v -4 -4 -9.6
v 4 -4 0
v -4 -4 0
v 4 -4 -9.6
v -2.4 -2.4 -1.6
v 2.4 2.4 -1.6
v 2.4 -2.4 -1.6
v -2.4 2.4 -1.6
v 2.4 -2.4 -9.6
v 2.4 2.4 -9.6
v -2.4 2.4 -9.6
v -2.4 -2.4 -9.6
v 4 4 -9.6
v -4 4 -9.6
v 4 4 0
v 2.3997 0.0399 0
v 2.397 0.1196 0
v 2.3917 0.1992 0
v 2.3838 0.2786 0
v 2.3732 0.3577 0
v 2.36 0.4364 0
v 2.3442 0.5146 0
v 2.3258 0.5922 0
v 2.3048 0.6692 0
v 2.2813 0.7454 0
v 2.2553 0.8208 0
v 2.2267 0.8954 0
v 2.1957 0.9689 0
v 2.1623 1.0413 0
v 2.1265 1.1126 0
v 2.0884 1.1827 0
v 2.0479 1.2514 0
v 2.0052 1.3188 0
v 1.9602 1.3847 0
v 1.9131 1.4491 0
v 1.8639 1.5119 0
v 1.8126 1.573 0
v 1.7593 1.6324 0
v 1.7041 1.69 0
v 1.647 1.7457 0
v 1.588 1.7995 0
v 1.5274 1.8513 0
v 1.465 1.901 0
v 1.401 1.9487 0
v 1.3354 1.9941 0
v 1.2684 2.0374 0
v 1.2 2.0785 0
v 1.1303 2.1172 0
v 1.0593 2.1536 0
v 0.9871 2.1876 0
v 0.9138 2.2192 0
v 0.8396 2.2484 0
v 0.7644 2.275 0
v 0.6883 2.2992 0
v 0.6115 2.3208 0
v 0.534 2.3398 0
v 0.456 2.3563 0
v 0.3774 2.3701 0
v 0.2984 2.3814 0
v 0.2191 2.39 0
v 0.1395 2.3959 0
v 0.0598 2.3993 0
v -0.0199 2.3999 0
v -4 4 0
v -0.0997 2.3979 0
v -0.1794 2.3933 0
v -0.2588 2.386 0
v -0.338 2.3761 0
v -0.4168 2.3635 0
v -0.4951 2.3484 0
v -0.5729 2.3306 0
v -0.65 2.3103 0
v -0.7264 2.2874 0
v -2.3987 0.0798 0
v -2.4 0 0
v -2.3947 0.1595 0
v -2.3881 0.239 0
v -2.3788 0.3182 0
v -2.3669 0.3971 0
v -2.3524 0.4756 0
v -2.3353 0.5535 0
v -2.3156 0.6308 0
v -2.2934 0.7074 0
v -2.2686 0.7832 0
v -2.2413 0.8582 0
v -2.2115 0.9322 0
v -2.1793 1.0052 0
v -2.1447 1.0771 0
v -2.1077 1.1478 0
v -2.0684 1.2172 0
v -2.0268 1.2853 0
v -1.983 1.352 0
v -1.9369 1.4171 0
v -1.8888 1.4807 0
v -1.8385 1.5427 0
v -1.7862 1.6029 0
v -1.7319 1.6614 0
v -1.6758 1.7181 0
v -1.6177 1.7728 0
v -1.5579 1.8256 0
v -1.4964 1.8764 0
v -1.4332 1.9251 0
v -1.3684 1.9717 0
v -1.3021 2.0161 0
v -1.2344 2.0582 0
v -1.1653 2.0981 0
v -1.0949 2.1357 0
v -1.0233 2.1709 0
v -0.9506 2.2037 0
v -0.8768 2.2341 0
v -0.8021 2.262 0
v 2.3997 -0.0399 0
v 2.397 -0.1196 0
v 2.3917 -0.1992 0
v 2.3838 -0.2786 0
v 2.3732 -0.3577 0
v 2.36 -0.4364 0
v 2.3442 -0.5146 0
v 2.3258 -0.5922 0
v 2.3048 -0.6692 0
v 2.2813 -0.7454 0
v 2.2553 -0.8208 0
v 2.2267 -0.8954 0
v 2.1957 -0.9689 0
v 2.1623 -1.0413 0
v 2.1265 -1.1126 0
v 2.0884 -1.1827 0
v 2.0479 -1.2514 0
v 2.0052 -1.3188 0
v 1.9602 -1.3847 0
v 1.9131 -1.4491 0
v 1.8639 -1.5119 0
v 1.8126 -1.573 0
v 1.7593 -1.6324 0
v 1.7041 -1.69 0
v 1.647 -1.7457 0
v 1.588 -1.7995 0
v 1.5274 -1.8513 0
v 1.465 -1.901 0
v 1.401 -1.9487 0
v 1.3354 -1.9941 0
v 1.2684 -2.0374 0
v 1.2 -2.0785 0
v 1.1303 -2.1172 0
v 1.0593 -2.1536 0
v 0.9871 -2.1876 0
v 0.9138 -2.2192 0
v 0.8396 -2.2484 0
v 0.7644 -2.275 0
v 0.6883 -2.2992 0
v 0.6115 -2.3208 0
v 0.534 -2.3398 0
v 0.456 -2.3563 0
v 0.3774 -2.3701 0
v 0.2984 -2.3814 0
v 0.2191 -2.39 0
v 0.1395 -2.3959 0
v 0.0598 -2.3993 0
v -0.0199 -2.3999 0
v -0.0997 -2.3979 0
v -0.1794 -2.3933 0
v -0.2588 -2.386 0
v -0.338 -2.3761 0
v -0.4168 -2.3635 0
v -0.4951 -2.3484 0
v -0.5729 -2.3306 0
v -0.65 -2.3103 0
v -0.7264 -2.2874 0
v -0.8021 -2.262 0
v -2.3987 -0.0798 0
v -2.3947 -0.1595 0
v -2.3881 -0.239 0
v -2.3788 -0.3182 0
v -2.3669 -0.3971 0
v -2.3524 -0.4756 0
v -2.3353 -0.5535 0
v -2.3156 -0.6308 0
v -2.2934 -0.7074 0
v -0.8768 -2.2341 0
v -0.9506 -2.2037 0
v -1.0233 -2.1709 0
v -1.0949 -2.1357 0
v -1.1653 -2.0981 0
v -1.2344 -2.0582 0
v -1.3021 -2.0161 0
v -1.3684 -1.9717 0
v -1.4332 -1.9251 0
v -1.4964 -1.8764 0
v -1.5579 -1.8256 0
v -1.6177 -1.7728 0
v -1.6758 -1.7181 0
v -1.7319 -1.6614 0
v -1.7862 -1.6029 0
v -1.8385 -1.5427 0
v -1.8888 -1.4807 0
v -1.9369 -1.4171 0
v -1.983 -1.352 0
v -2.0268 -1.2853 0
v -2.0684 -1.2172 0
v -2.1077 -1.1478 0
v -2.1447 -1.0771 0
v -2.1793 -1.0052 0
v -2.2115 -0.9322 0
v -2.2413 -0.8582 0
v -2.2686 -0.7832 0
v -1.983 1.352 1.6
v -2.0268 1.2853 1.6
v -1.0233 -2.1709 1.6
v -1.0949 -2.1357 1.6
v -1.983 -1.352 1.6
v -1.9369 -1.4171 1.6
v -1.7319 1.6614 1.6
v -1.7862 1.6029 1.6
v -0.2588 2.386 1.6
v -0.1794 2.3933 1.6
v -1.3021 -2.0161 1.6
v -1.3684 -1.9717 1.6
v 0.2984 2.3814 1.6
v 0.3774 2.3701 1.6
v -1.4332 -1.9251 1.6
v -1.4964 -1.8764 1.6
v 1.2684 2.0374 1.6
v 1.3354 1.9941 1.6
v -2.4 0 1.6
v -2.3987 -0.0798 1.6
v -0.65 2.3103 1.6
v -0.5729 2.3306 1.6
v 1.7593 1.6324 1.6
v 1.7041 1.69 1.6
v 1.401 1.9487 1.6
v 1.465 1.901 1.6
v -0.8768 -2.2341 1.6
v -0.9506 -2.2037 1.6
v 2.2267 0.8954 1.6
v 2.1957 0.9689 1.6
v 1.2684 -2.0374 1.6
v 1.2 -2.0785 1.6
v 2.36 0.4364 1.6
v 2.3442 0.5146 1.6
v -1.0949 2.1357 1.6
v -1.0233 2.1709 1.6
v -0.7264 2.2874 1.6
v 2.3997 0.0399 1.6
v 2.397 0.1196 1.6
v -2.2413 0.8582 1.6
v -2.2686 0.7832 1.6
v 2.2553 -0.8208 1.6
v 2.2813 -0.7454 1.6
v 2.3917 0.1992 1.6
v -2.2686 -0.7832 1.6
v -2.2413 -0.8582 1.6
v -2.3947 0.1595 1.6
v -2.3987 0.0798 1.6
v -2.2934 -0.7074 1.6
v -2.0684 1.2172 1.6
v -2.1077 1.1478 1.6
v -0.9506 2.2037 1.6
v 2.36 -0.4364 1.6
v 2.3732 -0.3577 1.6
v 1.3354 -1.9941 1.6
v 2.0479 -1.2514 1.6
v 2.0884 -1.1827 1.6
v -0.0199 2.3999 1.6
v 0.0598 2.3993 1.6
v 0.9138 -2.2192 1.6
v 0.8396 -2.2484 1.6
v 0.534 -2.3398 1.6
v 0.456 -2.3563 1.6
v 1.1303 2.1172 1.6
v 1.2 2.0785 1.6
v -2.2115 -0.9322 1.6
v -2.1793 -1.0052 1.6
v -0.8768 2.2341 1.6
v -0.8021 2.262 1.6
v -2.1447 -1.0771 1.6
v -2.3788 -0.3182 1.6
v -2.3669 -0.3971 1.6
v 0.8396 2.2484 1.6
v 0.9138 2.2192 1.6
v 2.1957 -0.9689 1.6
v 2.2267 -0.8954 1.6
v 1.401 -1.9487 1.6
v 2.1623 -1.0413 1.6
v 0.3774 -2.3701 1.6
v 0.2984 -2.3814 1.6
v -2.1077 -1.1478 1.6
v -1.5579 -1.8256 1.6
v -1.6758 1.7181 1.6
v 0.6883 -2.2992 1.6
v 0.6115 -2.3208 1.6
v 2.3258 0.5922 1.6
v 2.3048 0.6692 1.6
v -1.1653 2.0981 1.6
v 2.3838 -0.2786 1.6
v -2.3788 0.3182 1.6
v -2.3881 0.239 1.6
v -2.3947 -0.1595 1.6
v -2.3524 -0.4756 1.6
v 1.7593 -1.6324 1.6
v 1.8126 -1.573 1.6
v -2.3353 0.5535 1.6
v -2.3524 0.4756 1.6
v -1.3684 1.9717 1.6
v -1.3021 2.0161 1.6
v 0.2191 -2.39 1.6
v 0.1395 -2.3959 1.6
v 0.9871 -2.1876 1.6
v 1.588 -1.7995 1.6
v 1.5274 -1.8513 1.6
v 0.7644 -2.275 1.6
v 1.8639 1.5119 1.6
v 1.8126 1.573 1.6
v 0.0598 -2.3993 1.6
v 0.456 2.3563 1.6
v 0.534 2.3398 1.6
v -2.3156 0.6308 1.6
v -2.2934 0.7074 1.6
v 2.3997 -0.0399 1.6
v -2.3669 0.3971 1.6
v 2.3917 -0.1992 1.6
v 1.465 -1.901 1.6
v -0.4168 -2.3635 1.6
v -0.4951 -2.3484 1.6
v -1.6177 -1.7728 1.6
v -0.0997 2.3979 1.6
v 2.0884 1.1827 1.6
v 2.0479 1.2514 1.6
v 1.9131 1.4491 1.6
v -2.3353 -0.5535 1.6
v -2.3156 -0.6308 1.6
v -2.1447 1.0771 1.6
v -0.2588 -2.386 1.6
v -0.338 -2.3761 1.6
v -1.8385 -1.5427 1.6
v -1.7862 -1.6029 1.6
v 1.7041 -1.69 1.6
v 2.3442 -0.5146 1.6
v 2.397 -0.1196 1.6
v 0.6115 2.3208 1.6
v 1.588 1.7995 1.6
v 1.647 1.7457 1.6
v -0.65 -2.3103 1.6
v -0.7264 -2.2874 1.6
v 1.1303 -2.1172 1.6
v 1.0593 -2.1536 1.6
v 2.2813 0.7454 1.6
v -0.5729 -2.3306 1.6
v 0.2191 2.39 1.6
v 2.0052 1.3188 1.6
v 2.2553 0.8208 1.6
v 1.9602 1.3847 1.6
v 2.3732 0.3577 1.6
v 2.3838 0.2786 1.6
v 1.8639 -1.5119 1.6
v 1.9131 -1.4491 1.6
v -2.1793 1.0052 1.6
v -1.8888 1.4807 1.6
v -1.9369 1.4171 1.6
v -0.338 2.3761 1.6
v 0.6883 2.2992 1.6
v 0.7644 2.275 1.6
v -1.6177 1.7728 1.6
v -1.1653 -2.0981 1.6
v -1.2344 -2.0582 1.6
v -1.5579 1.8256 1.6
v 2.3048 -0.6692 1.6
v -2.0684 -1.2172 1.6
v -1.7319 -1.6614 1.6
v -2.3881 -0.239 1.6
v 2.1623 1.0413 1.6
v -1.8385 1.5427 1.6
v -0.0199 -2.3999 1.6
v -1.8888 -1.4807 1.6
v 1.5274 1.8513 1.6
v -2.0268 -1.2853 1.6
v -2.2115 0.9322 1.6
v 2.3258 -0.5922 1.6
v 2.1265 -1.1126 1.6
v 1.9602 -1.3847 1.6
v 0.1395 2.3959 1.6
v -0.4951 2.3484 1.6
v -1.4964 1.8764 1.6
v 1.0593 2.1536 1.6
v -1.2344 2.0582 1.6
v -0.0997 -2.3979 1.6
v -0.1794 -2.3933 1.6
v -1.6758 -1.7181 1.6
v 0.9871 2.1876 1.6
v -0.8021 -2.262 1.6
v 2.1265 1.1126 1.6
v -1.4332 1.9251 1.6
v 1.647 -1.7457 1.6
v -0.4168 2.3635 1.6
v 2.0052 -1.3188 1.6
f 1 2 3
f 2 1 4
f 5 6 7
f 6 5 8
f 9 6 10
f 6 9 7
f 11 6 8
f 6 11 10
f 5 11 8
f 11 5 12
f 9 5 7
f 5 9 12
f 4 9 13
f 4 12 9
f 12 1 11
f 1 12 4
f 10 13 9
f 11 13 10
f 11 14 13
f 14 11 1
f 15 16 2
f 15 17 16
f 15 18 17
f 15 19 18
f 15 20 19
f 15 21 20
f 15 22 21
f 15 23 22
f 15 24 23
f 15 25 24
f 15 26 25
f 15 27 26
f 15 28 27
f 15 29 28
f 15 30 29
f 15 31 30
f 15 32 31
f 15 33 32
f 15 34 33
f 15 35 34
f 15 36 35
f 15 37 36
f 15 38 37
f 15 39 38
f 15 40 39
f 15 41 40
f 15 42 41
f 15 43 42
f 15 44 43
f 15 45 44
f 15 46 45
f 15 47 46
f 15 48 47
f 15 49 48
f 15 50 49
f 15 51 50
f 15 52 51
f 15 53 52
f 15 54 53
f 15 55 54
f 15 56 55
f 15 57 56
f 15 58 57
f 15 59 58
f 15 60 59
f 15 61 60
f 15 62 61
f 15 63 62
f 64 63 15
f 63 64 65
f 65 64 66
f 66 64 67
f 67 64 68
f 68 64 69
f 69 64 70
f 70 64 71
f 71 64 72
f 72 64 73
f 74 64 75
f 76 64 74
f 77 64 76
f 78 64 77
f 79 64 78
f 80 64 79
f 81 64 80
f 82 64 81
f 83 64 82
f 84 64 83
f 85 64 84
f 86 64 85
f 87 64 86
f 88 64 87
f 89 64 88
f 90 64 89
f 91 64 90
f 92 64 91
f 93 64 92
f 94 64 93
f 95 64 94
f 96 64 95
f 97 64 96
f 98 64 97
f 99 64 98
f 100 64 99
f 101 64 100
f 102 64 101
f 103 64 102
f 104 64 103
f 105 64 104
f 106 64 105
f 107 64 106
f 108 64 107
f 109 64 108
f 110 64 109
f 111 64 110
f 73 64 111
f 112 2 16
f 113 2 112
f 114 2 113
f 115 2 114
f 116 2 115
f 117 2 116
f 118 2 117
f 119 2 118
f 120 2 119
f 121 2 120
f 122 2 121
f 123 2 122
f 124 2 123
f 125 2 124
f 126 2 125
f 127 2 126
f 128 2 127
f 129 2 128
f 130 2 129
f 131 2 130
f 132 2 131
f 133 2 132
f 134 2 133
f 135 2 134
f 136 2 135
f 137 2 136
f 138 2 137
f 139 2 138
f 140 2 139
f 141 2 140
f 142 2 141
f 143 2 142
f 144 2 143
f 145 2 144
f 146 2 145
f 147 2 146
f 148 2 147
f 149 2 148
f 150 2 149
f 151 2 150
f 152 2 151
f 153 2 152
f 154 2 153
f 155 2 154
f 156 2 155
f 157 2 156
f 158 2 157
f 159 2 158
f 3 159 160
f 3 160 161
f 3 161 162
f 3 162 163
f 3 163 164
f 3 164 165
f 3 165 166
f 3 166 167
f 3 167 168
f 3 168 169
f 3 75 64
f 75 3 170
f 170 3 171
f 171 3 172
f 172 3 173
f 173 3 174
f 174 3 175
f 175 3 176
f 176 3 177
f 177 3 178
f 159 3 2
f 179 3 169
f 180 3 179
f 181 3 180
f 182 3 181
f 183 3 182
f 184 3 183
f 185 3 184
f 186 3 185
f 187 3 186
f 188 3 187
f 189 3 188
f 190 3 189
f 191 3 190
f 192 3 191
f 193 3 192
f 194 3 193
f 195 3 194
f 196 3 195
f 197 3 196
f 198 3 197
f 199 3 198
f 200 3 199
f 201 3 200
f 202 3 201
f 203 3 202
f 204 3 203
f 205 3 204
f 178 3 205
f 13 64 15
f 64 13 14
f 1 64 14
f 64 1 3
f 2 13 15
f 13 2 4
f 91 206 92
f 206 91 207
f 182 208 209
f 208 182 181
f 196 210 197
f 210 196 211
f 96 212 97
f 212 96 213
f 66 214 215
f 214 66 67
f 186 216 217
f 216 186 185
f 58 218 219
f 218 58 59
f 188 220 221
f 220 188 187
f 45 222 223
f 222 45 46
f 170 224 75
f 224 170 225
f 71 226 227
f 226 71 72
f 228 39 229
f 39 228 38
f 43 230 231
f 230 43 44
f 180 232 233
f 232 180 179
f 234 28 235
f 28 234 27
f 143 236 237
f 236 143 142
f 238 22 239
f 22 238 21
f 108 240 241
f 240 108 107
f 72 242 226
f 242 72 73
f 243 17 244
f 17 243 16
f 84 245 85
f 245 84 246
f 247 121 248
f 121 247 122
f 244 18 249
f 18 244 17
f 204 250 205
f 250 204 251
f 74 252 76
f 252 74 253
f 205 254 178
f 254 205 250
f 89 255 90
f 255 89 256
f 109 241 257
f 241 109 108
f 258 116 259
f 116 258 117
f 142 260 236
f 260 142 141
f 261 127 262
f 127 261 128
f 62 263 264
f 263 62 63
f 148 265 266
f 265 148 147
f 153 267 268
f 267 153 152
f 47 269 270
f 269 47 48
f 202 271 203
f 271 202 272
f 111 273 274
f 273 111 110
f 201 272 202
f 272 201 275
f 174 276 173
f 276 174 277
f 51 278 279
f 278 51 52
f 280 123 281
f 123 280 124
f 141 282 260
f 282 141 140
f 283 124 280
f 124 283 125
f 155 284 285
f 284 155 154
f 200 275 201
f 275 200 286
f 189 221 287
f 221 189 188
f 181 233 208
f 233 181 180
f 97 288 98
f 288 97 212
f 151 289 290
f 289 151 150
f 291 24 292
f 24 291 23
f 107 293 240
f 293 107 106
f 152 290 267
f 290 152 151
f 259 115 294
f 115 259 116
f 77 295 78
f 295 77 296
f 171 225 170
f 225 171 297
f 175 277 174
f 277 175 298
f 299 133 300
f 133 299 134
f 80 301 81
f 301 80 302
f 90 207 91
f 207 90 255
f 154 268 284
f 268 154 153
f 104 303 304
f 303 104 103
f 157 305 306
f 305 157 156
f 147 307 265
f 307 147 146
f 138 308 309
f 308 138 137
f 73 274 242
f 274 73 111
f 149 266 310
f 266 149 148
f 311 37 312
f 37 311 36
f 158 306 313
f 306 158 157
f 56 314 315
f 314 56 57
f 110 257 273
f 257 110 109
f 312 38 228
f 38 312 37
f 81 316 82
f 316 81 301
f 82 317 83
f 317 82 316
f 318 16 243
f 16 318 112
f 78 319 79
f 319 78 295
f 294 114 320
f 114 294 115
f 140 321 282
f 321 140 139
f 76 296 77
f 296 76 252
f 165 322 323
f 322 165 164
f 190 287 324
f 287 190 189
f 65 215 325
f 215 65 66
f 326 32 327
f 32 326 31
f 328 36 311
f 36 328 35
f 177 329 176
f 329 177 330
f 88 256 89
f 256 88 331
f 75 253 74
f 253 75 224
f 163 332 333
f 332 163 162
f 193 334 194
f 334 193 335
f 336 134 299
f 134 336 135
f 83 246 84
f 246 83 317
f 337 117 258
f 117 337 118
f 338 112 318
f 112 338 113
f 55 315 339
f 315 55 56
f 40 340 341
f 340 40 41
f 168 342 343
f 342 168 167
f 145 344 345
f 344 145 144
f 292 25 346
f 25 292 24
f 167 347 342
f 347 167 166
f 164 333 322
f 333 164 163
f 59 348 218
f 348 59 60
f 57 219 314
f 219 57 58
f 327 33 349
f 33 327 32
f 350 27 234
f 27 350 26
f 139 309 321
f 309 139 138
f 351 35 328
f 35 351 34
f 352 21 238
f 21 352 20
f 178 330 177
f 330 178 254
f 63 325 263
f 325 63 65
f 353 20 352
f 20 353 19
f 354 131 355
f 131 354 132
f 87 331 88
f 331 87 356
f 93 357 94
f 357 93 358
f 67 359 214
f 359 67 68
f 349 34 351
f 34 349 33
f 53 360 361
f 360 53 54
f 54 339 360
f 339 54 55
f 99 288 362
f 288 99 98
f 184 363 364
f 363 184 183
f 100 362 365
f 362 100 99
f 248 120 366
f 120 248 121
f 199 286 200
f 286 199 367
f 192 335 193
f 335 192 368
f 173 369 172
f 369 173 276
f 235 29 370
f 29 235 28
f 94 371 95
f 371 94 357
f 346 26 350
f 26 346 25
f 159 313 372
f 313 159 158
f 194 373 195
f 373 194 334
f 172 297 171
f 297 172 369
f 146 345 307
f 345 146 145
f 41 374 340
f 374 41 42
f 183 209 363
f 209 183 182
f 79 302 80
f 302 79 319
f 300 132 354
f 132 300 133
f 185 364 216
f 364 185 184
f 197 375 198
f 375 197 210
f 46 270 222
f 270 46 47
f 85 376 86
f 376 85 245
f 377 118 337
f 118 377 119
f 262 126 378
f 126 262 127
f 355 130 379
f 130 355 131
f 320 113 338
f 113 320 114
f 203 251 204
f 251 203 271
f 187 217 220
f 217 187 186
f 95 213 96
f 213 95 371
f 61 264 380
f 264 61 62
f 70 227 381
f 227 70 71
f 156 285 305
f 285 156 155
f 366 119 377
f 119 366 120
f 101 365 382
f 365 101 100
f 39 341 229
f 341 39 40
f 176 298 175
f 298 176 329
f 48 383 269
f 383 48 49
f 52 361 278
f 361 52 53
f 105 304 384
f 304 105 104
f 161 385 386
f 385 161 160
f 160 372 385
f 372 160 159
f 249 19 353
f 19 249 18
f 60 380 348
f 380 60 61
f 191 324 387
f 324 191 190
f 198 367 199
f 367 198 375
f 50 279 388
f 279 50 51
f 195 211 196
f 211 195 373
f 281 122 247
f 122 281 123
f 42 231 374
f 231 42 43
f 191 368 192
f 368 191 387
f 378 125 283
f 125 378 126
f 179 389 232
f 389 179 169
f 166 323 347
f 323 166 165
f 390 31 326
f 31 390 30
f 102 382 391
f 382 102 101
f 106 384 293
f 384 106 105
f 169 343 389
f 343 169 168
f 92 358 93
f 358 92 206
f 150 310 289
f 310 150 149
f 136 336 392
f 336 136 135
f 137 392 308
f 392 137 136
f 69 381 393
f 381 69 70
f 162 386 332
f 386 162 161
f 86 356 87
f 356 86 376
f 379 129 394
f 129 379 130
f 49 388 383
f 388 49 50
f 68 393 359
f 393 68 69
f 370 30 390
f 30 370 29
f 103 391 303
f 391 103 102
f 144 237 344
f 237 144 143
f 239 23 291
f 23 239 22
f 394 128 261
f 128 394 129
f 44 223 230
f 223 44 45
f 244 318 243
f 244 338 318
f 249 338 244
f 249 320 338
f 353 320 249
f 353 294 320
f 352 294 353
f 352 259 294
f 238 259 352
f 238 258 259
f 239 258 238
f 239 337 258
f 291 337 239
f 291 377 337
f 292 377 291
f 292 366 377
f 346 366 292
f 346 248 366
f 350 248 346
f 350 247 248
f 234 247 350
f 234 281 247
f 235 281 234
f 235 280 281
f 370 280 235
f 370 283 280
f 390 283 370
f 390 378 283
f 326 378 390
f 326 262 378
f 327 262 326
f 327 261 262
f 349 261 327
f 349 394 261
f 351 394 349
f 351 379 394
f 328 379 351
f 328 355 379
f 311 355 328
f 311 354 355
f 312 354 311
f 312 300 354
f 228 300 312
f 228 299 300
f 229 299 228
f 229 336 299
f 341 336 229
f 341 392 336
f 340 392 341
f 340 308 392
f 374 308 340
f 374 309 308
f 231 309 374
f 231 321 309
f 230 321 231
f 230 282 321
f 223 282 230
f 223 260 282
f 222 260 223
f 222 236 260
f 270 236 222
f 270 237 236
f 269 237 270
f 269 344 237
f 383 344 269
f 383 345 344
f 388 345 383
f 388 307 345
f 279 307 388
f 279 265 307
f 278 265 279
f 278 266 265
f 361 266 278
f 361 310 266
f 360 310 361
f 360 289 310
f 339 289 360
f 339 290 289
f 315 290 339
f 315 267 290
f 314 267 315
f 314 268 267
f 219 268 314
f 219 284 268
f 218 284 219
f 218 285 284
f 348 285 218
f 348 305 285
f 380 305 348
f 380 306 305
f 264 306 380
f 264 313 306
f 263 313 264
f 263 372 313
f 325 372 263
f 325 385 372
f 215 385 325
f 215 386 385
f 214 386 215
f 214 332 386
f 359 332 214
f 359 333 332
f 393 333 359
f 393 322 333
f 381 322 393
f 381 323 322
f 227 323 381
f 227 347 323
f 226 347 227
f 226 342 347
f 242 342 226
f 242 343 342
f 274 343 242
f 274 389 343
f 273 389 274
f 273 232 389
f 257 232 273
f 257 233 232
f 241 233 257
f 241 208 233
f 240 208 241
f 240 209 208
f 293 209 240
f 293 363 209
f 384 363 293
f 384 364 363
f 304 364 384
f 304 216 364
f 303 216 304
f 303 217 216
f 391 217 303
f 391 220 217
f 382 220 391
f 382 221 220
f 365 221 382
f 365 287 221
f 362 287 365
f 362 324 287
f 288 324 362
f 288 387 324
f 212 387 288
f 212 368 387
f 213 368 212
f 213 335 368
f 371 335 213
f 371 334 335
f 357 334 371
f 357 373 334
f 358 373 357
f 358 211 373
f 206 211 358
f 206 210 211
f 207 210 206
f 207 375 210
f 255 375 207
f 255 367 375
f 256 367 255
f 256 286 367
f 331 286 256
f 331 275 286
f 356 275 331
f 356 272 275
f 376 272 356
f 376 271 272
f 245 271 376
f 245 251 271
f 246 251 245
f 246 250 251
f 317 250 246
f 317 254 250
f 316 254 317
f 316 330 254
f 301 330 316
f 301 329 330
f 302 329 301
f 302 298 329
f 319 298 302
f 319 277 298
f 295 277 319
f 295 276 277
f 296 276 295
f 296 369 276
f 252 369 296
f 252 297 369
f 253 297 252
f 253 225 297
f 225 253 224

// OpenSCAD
// file: ../p/4-4edge.scad
use <../lib.scad>
$fa=1; $fs=0.2;
function ldraw_lib__4_4edge(realsolid=false) = [
// 0 Circle 1.0
// 0 Name: 4-4edge.dat
// 0 Author: James Jessiman
// 0 !LDRAW_ORG Primitive UPDATE 2017-01
// 0 !LICENSE Licensed under CC BY 2.0 and CC BY 4.0 : see CAreadme.txt
// 
// 0 BFC CERTIFY CCW
  [0,"BFC","CERTIFY"],
  [0,"BFC","CCW"],
// 
// 0 !HISTORY 1998-12-15 [PTadmin] Official Update 1998-10
// 0 !HISTORY 2005-12-28 [PTadmin] Official Update 2005-01
// 0 !HISTORY 2007-06-24 [PTadmin] Header formatted for Contributor Agreement
// 0 !HISTORY 2008-07-01 [PTadmin] Official Update 2008-01
// 0 !HISTORY 2017-01-15 [Steffen] BFCed
// 0 !HISTORY 2017-12-30 [PTadmin] Official Update 2017-01
// 
// 
// 2 24 1 0 0 0.9239 0 0.3827
  [2,24,1,0,0,0.9239,0,0.3827],
// 2 24 0.9239 0 0.3827 0.7071 0 0.7071
  [2,24,0.9239,0,0.3827,0.7071,0,0.7071],
// 2 24 0.7071 0 0.7071 0.3827 0 0.9239
  [2,24,0.7071,0,0.7071,0.3827,0,0.9239],
// 2 24 0.3827 0 0.9239 0 0 1
  [2,24,0.3827,0,0.9239,0,0,1],
// 2 24 0 0 1 -0.3827 0 0.9239
  [2,24,0,0,1,-0.3827,0,0.9239],
// 2 24 -0.3827 0 0.9239 -0.7071 0 0.7071
  [2,24,-0.3827,0,0.9239,-0.7071,0,0.7071],
// 2 24 -0.7071 0 0.7071 -0.9239 0 0.3827
  [2,24,-0.7071,0,0.7071,-0.9239,0,0.3827],
// 2 24 -0.9239 0 0.3827 -1 0 -0
  [2,24,-0.9239,0,0.3827,-1,0,-0],
// 2 24 -1 0 -0 -0.9239 0 -0.3827
  [2,24,-1,0,-0,-0.9239,0,-0.3827],
// 2 24 -0.9239 0 -0.3827 -0.7071 0 -0.7071
  [2,24,-0.9239,0,-0.3827,-0.7071,0,-0.7071],
// 2 24 -0.7071 0 -0.7071 -0.3827 0 -0.9239
  [2,24,-0.7071,0,-0.7071,-0.3827,0,-0.9239],
// 2 24 -0.3827 0 -0.9239 0 0 -1
  [2,24,-0.3827,0,-0.9239,0,0,-1],
// 2 24 0 0 -1 0.3827 0 -0.9239
  [2,24,0,0,-1,0.3827,0,-0.9239],
// 2 24 0.3827 0 -0.9239 0.7071 0 -0.7071
  [2,24,0.3827,0,-0.9239,0.7071,0,-0.7071],
// 2 24 0.7071 0 -0.7071 0.9239 0 -0.3827
  [2,24,0.7071,0,-0.7071,0.9239,0,-0.3827],
// 2 24 0.9239 0 -0.3827 1 0 0
  [2,24,0.9239,0,-0.3827,1,0,0],
];
module ldraw_lib__4_4edge(step=0, col=false, unit=2/5, alt=false, line=0.2, solid=!$preview)
    makepoly(ldraw_lib__4_4edge(solid), step=step, col=col, unit=unit, alt=alt, line=line, solid=solid);
ldraw_lib__4_4edge(line=0.2);
// file: ../p/4-4disc.scad
use <../lib.scad>
$fa=1; $fs=0.2;
function ldraw_lib__4_4disc(realsolid=false) = [
// 0 Disc 1.0
// 0 Name: 4-4disc.dat
// 0 Author: James Jessiman
// 0 !LDRAW_ORG Primitive UPDATE 2002-02
// 0 !LICENSE Licensed under CC BY 2.0 and CC BY 4.0 : see CAreadme.txt
// 
// 0 BFC CERTIFY CCW
  [0,"BFC","CERTIFY"],
  [0,"BFC","CCW"],
// 
// 0 !HISTORY 1998-12-15 [PTadmin] Official Update 1998-10
// 0 !HISTORY 2002-03-23 [sbliss] Added BFC statement
// 0 !HISTORY 2002-04-25 [PTadmin] Official Update 2002-02
// 0 !HISTORY 2007-06-24 [PTadmin] Header formatted for Contributor Agreement
// 0 !HISTORY 2008-07-01 [PTadmin] Official Update 2008-01
// 
// 
// 3 16 0 0 0 1 0 0 0.9239 0 0.3827
  [3,16,0,0,0,1,0,0,0.9239,0,0.3827],
// 3 16 0 0 0 0.9239 0 0.3827 0.7071 0 0.7071
  [3,16,0,0,0,0.9239,0,0.3827,0.7071,0,0.7071],
// 3 16 0 0 0 0.7071 0 0.7071 0.3827 0 0.9239
  [3,16,0,0,0,0.7071,0,0.7071,0.3827,0,0.9239],
// 3 16 0 0 0 0.3827 0 0.9239 0 0 1
  [3,16,0,0,0,0.3827,0,0.9239,0,0,1],
// 3 16 0 0 0 0 0 1 -0.3827 0 0.9239
  [3,16,0,0,0,0,0,1,-0.3827,0,0.9239],
// 3 16 0 0 0 -0.3827 0 0.9239 -0.7071 0 0.7071
  [3,16,0,0,0,-0.3827,0,0.9239,-0.7071,0,0.7071],
// 3 16 0 0 0 -0.7071 0 0.7071 -0.9239 0 0.3827
  [3,16,0,0,0,-0.7071,0,0.7071,-0.9239,0,0.3827],
// 3 16 0 0 0 -0.9239 0 0.3827 -1 0 -0
  [3,16,0,0,0,-0.9239,0,0.3827,-1,0,-0],
// 3 16 0 0 0 -1 0 -0 -0.9239 0 -0.3827
  [3,16,0,0,0,-1,0,-0,-0.9239,0,-0.3827],
// 3 16 0 0 0 -0.9239 0 -0.3827 -0.7071 0 -0.7071
  [3,16,0,0,0,-0.9239,0,-0.3827,-0.7071,0,-0.7071],
// 3 16 0 0 0 -0.7071 0 -0.7071 -0.3827 0 -0.9239
  [3,16,0,0,0,-0.7071,0,-0.7071,-0.3827,0,-0.9239],
// 3 16 0 0 0 -0.3827 0 -0.9239 0 0 -1
  [3,16,0,0,0,-0.3827,0,-0.9239,0,0,-1],
// 3 16 0 0 0 0 0 -1 0.3827 0 -0.9239
  [3,16,0,0,0,0,0,-1,0.3827,0,-0.9239],
// 3 16 0 0 0 0.3827 0 -0.9239 0.7071 0 -0.7071
  [3,16,0,0,0,0.3827,0,-0.9239,0.7071,0,-0.7071],
// 3 16 0 0 0 0.7071 0 -0.7071 0.9239 0 -0.3827
  [3,16,0,0,0,0.7071,0,-0.7071,0.9239,0,-0.3827],
// 3 16 0 0 0 0.9239 0 -0.3827 1 0 0
  [3,16,0,0,0,0.9239,0,-0.3827,1,0,0],
// 0
];
module ldraw_lib__4_4disc(step=0, col=false, unit=2/5, alt=false, line=0.2, solid=!$preview)
    makepoly(ldraw_lib__4_4disc(solid), step=step, col=col, unit=unit, alt=alt, line=line, solid=solid);
ldraw_lib__4_4disc(line=0.2);
// file: ../p/4-4cyli.scad
use <../lib.scad>
$fa=1; $fs=0.2;
function ldraw_lib__4_4cyli(realsolid=false) = [
// 0 Cylinder 1.0
// 0 Name: 4-4cyli.dat
// 0 Author: James Jessiman
// 0 !LDRAW_ORG Primitive UPDATE 2005-01
// 0 !LICENSE Licensed under CC BY 2.0 and CC BY 4.0 : see CAreadme.txt
// 
// 0 BFC CERTIFY CCW
  [0,"BFC","CERTIFY"],
  [0,"BFC","CCW"],
// 
// 0 !HISTORY 1998-12-15 [PTadmin] Official Update 1998-10
// 0 !HISTORY 2002-03-23 [sbliss] Added BFC statement; merged headers from files in distributions LDraw 0.27 and Complete.
// 0 !HISTORY 2002-04-25 [PTadmin] Official Update 2002-02
// 0 !HISTORY 2004-12-14 [guyvivan] BFC CCW
// 0 !HISTORY 2005-12-28 [PTadmin] Official Update 2005-01
// 0 !HISTORY 2007-06-24 [PTadmin] Header formatted for Contributor Agreement
// 0 !HISTORY 2008-07-01 [PTadmin] Official Update 2008-01
// 
// 
// 4 16 1 1 0 0.9239 1 0.3827 0.9239 0 0.3827 1 0 0
  [4,16,1,1,0,0.9239,1,0.3827,0.9239,0,0.3827,1,0,0],
// 5 24 1 0 0 1 1 0 0.9239 0 0.3827 0.9239 0 -0.3827
  [5,24,1,0,0,1,1,0,0.9239,0,0.3827,0.9239,0,-0.3827],
// 4 16 0.9239 1 0.3827 0.7071 1 0.7071 0.7071 0 0.7071 0.9239 0 0.3827
  [4,16,0.9239,1,0.3827,0.7071,1,0.7071,0.7071,0,0.7071,0.9239,0,0.3827],
// 5 24 0.9239 0 0.3827 0.9239 1 0.3827 0.7071 0 0.7071 1 0 0
  [5,24,0.9239,0,0.3827,0.9239,1,0.3827,0.7071,0,0.7071,1,0,0],
// 4 16 0.7071 1 0.7071 0.3827 1 0.9239 0.3827 0 0.9239 0.7071 0 0.7071
  [4,16,0.7071,1,0.7071,0.3827,1,0.9239,0.3827,0,0.9239,0.7071,0,0.7071],
// 5 24 0.7071 0 0.7071 0.7071 1 0.7071 0.3827 0 0.9239 0.9239 0 0.3827
  [5,24,0.7071,0,0.7071,0.7071,1,0.7071,0.3827,0,0.9239,0.9239,0,0.3827],
// 4 16 0.3827 1 0.9239 0 1 1 0 0 1 0.3827 0 0.9239
  [4,16,0.3827,1,0.9239,0,1,1,0,0,1,0.3827,0,0.9239],
// 5 24 0.3827 0 0.9239 0.3827 1 0.9239 0 0 1 0.7071 0 0.7071
  [5,24,0.3827,0,0.9239,0.3827,1,0.9239,0,0,1,0.7071,0,0.7071],
// 4 16 0 1 1 -0.3827 1 0.9239 -0.3827 0 0.9239 0 0 1
  [4,16,0,1,1,-0.3827,1,0.9239,-0.3827,0,0.9239,0,0,1],
// 5 24 0 0 1 0 1 1 -0.3827 0 0.9239 0.3827 0 0.9239
  [5,24,0,0,1,0,1,1,-0.3827,0,0.9239,0.3827,0,0.9239],
// 4 16 -0.3827 1 0.9239 -0.7071 1 0.7071 -0.7071 0 0.7071 -0.3827 0 0.9239
  [4,16,-0.3827,1,0.9239,-0.7071,1,0.7071,-0.7071,0,0.7071,-0.3827,0,0.9239],
// 5 24 -0.3827 0 0.9239 -0.3827 1 0.9239 -0.7071 0 0.7071 0 0 1
  [5,24,-0.3827,0,0.9239,-0.3827,1,0.9239,-0.7071,0,0.7071,0,0,1],
// 4 16 -0.7071 1 0.7071 -0.9239 1 0.3827 -0.9239 0 0.3827 -0.7071 0 0.7071
  [4,16,-0.7071,1,0.7071,-0.9239,1,0.3827,-0.9239,0,0.3827,-0.7071,0,0.7071],
// 5 24 -0.7071 0 0.7071 -0.7071 1 0.7071 -0.9239 0 0.3827 -0.3827 0 0.9239
  [5,24,-0.7071,0,0.7071,-0.7071,1,0.7071,-0.9239,0,0.3827,-0.3827,0,0.9239],
// 4 16 -0.9239 1 0.3827 -1 1 0 -1 0 0 -0.9239 0 0.3827
  [4,16,-0.9239,1,0.3827,-1,1,0,-1,0,0,-0.9239,0,0.3827],
// 5 24 -0.9239 0 0.3827 -0.9239 1 0.3827 -1 0 0 -0.7071 0 0.7071
  [5,24,-0.9239,0,0.3827,-0.9239,1,0.3827,-1,0,0,-0.7071,0,0.7071],
// 4 16 -1 1 0 -0.9239 1 -0.3827 -0.9239 0 -0.3827 -1 0 0
  [4,16,-1,1,0,-0.9239,1,-0.3827,-0.9239,0,-0.3827,-1,0,0],
// 5 24 -1 0 0 -1 1 0 -0.9239 0 -0.3827 -0.9239 0 0.3827
  [5,24,-1,0,0,-1,1,0,-0.9239,0,-0.3827,-0.9239,0,0.3827],
// 4 16 -0.9239 1 -0.3827 -0.7071 1 -0.7071 -0.7071 0 -0.7071 -0.9239 0 -0.3827
  [4,16,-0.9239,1,-0.3827,-0.7071,1,-0.7071,-0.7071,0,-0.7071,-0.9239,0,-0.3827],
// 5 24 -0.9239 0 -0.3827 -0.9239 1 -0.3827 -0.7071 0 -0.7071 -1 0 0
  [5,24,-0.9239,0,-0.3827,-0.9239,1,-0.3827,-0.7071,0,-0.7071,-1,0,0],
// 4 16 -0.7071 1 -0.7071 -0.3827 1 -0.9239 -0.3827 0 -0.9239 -0.7071 0 -0.7071
  [4,16,-0.7071,1,-0.7071,-0.3827,1,-0.9239,-0.3827,0,-0.9239,-0.7071,0,-0.7071],
// 5 24 -0.7071 0 -0.7071 -0.7071 1 -0.7071 -0.3827 0 -0.9239 -0.9239 0 -0.3827
  [5,24,-0.7071,0,-0.7071,-0.7071,1,-0.7071,-0.3827,0,-0.9239,-0.9239,0,-0.3827],
// 4 16 -0.3827 1 -0.9239 0 1 -1 0 0 -1 -0.3827 0 -0.9239
  [4,16,-0.3827,1,-0.9239,0,1,-1,0,0,-1,-0.3827,0,-0.9239],
// 5 24 -0.3827 0 -0.9239 -0.3827 1 -0.9239 0 0 -1 -0.7071 0 -0.7071
  [5,24,-0.3827,0,-0.9239,-0.3827,1,-0.9239,0,0,-1,-0.7071,0,-0.7071],
// 4 16 0 1 -1 0.3827 1 -0.9239 0.3827 0 -0.9239 0 0 -1
  [4,16,0,1,-1,0.3827,1,-0.9239,0.3827,0,-0.9239,0,0,-1],
// 5 24 0 0 -1 0 1 -1 0.3827 0 -0.9239 -0.3827 0 -0.9239
  [5,24,0,0,-1,0,1,-1,0.3827,0,-0.9239,-0.3827,0,-0.9239],
// 4 16 0.3827 1 -0.9239 0.7071 1 -0.7071 0.7071 0 -0.7071 0.3827 0 -0.9239
  [4,16,0.3827,1,-0.9239,0.7071,1,-0.7071,0.7071,0,-0.7071,0.3827,0,-0.9239],
// 5 24 0.3827 0 -0.9239 0.3827 1 -0.9239 0.7071 0 -0.7071 0 0 -1
  [5,24,0.3827,0,-0.9239,0.3827,1,-0.9239,0.7071,0,-0.7071,0,0,-1],
// 4 16 0.7071 1 -0.7071 0.9239 1 -0.3827 0.9239 0 -0.3827 0.7071 0 -0.7071
  [4,16,0.7071,1,-0.7071,0.9239,1,-0.3827,0.9239,0,-0.3827,0.7071,0,-0.7071],
// 5 24 0.7071 0 -0.7071 0.7071 1 -0.7071 0.9239 0 -0.3827 0.3827 0 -0.9239
  [5,24,0.7071,0,-0.7071,0.7071,1,-0.7071,0.9239,0,-0.3827,0.3827,0,-0.9239],
// 4 16 0.9239 1 -0.3827 1 1 0 1 0 0 0.9239 0 -0.3827
  [4,16,0.9239,1,-0.3827,1,1,0,1,0,0,0.9239,0,-0.3827],
// 5 24 0.9239 0 -0.3827 0.9239 1 -0.3827 1 0 0 0.7071 0 -0.7071
  [5,24,0.9239,0,-0.3827,0.9239,1,-0.3827,1,0,0,0.7071,0,-0.7071],
// 0
];
module ldraw_lib__4_4cyli(step=0, col=false, unit=2/5, alt=false, line=0.2, solid=!$preview)
    makepoly(ldraw_lib__4_4cyli(solid), step=step, col=col, unit=unit, alt=alt, line=line, solid=solid);
ldraw_lib__4_4cyli(line=0.2);
// file: ../p/stud3.scad
use <../lib.scad>
use <4-4cyli.scad>
use <4-4disc.scad>
use <4-4edge.scad>
$fa=1; $fs=0.2;
function ldraw_lib__stud3(realsolid=false) = realsolid ? 
    [openscad(translate([0,0,-eps()], o=cylinder(4+eps(), r=4)),2)] : [
// 0 Stud Tube Solid
// 0 Name: stud3.dat
// 0 Author: James Jessiman
// 0 !LDRAW_ORG Primitive UPDATE 2012-01
// 0 !LICENSE Licensed under CC BY 2.0 and CC BY 4.0 : see CAreadme.txt
// 
// 0 BFC CERTIFY CCW
  [0,"BFC","CERTIFY"],
  [0,"BFC","CCW"],
// 
// 0 !HISTORY 2002-04-04 [sbliss] Modified for BFC compliance
// 0 !HISTORY 2002-04-25 [PTadmin] Official Update 2002-02
// 0 !HISTORY 2007-06-24 [PTadmin] Header formatted for Contributor Agreement
// 0 !HISTORY 2008-07-01 [PTadmin] Official Update 2008-01
// 0 !HISTORY 2012-02-16 [Philo] Changed to CCW
// 0 !HISTORY 2012-03-30 [PTadmin] Official Update 2012-01
// 
// 
// 1 16 0 -4 0 4 0 0 0 1 0 0 0 4 4-4edge.dat
  [1,16,0,-4,0,4,0,0,0,1,0,0,0,4, ldraw_lib__4_4edge(realsolid)],
// 1 16 0 0 0 4 0 0 0 1 0 0 0 4 4-4edge.dat
  [1,16,0,0,0,4,0,0,0,1,0,0,0,4, ldraw_lib__4_4edge(realsolid)],
// 1 16 0 -4 0 4 0 0 0 1 0 0 0 4 4-4disc.dat
  [1,16,0,-4,0,4,0,0,0,1,0,0,0,4, ldraw_lib__4_4disc(realsolid)],
// 1 16 0 -4 0 4 0 0 0 4 0 0 0 4 4-4cyli.dat
  [1,16,0,-4,0,4,0,0,0,4,0,0,0,4, ldraw_lib__4_4cyli(realsolid)],
];
module ldraw_lib__stud3(step=0, col=false, unit=2/5, alt=false, line=0.2, solid=!$preview)
    makepoly(ldraw_lib__stud3(solid), step=step, col=col, unit=unit, alt=alt, line=line, solid=solid);
ldraw_lib__stud3(line=0.2);
// file: ../p/stud.scad
use <../lib.scad>
use <4-4cyli.scad>
use <4-4disc.scad>
use <4-4edge.scad>
$fa=1; $fs=0.2;
function ldraw_lib__stud(realsolid=false) = realsolid ? 
    [openscad(translate([0,0,-eps()], o=cylinder(4+eps(), r=6)),2)] : [
// 0 Stud
// 0 Name: stud.dat
// 0 Author: James Jessiman
// 0 !LDRAW_ORG Primitive UPDATE 2012-01
// 0 !LICENSE Licensed under CC BY 2.0 and CC BY 4.0 : see CAreadme.txt
// 
// 0 BFC CERTIFY CCW
  [0,"BFC","CERTIFY"],
  [0,"BFC","CCW"],
// 
// 0 !HISTORY 2002-04-04 [sbliss] Modified for BFC compliance
// 0 !HISTORY 2002-04-25 [PTadmin] Official Update 2002-02
// 0 !HISTORY 2007-06-24 [PTadmin] Header formatted for Contributor Agreement
// 0 !HISTORY 2008-07-01 [PTadmin] Official Update 2008-01
// 0 !HISTORY 2012-02-16 [Philo] Changed to CCW
// 0 !HISTORY 2012-03-30 [PTadmin] Official Update 2012-01
// 
// 
// 1 16 0 0 0 6 0 0 0 1 0 0 0 6 4-4edge.dat
  [1,16,0,0,0,6,0,0,0,1,0,0,0,6, ldraw_lib__4_4edge(realsolid)],
// 1 16 0 -4 0 6 0 0 0 1 0 0 0 6 4-4edge.dat
  [1,16,0,-4,0,6,0,0,0,1,0,0,0,6, ldraw_lib__4_4edge(realsolid)],
// 1 16 0 0 0 6 0 0 0 -4 0 0 0 6 4-4cyli.dat
  [1,16,0,0,0,6,0,0,0,-4,0,0,0,6, ldraw_lib__4_4cyli(realsolid)],
// 1 16 0 -4 0 6 0 0 0 1 0 0 0 6 4-4disc.dat
  [1,16,0,-4,0,6,0,0,0,1,0,0,0,6, ldraw_lib__4_4disc(realsolid)],
];
module ldraw_lib__stud(step=0, col=false, unit=2/5, alt=false, line=0.2, solid=!$preview)
    makepoly(ldraw_lib__stud(solid), step=step, col=col, unit=unit, alt=alt, line=line, solid=solid);
ldraw_lib__stud(line=0.2);
// file: ../p/box5.scad
use <../lib.scad>
$fa=1; $fs=0.2;
function ldraw_lib__box5(realsolid=false) = [
// 0 Box with 5 Faces and All Edges
// 0 Name: box5.dat
// 0 Author: James Jessiman
// 0 !LDRAW_ORG Primitive UPDATE 2012-01
// 0 !LICENSE Licensed under CC BY 2.0 and CC BY 4.0 : see CAreadme.txt
// 
// 0 BFC CERTIFY CCW
  [0,"BFC","CERTIFY"],
  [0,"BFC","CCW"],
// 
// 0 !HISTORY 2002-04-03 [sbliss] Modified for BFC compliance
// 0 !HISTORY 2002-04-25 [PTadmin] Official Update 2002-02
// 0 !HISTORY 2007-06-24 [PTadmin] Header formatted for Contributor Agreement
// 0 !HISTORY 2008-07-01 [PTadmin] Official Update 2008-01
// 0 !HISTORY 2012-02-16 [Philo] Changed to CCW
// 0 !HISTORY 2012-03-30 [PTadmin] Official Update 2012-01
// 
// 
// 2 24 1 1 1 -1 1 1
  [2,24,1,1,1,-1,1,1],
// 2 24 -1 1 1 -1 1 -1
  [2,24,-1,1,1,-1,1,-1],
// 2 24 -1 1 -1 1 1 -1
  [2,24,-1,1,-1,1,1,-1],
// 2 24 1 1 -1 1 1 1
  [2,24,1,1,-1,1,1,1],
// 2 24 1 0 1 -1 0 1
  [2,24,1,0,1,-1,0,1],
// 2 24 -1 0 1 -1 0 -1
  [2,24,-1,0,1,-1,0,-1],
// 2 24 -1 0 -1 1 0 -1
  [2,24,-1,0,-1,1,0,-1],
// 2 24 1 0 -1 1 0 1
  [2,24,1,0,-1,1,0,1],
// 2 24 1 0 1 1 1 1
  [2,24,1,0,1,1,1,1],
// 2 24 -1 0 1 -1 1 1
  [2,24,-1,0,1,-1,1,1],
// 2 24 1 0 -1 1 1 -1
  [2,24,1,0,-1,1,1,-1],
// 2 24 -1 0 -1 -1 1 -1
  [2,24,-1,0,-1,-1,1,-1],
// 4 16 -1 1 1 1 1 1 1 1 -1 -1 1 -1
  [4,16,-1,1,1,1,1,1,1,1,-1,-1,1,-1],
// 4 16 -1 1 1 -1 0 1 1 0 1 1 1 1
  [4,16,-1,1,1,-1,0,1,1,0,1,1,1,1],
// 4 16 -1 1 -1 -1 0 -1 -1 0 1 -1 1 1
  [4,16,-1,1,-1,-1,0,-1,-1,0,1,-1,1,1],
// 4 16 1 1 -1 1 0 -1 -1 0 -1 -1 1 -1
  [4,16,1,1,-1,1,0,-1,-1,0,-1,-1,1,-1],
// 4 16 1 1 1 1 0 1 1 0 -1 1 1 -1
  [4,16,1,1,1,1,0,1,1,0,-1,1,1,-1],
];
module ldraw_lib__box5(step=0, col=false, unit=2/5, alt=false, line=0.2, solid=!$preview)
    makepoly(ldraw_lib__box5(solid), step=step, col=col, unit=unit, alt=alt, line=line, solid=solid);
ldraw_lib__box5(line=0.2);
// file: ../p/box4t.scad
use <../lib.scad>
$fa=1; $fs=0.2;
function ldraw_lib__box4t(realsolid=false) = [
// 0 Box with 4 Adjacent Faces and All Edges
// 0 Name: box4t.dat
// 0 Author: Tore Eriksson [Tore_Eriksson]
// 0 !LDRAW_ORG Primitive UPDATE 2003-02
// 0 !LICENSE Licensed under CC BY 2.0 and CC BY 4.0 : see CAreadme.txt
// 
// 0 BFC CERTIFY CCW
  [0,"BFC","CERTIFY"],
  [0,"BFC","CCW"],
// 
// 0 !HISTORY 1997-09-29 [PTadmin] Official Update 1997-15
// 0 !HISTORY 2002-08-31 [izanette] Modified with WINDZ for BFC compliance
// 0 !HISTORY 2003-08-01 [PTadmin] Official Update 2003-02
// 0 !HISTORY 2007-06-24 [PTadmin] Header formatted for Contributor Agreement
// 0 !HISTORY 2008-07-01 [PTadmin] Official Update 2008-01
// 
// 
// 2 24 1 1 1 -1 1 1
  [2,24,1,1,1,-1,1,1],
// 2 24 -1 1 1 -1 1 -1
  [2,24,-1,1,1,-1,1,-1],
// 2 24 -1 1 -1 1 1 -1
  [2,24,-1,1,-1,1,1,-1],
// 2 24 1 1 -1 1 1 1
  [2,24,1,1,-1,1,1,1],
// 2 24 1 0 1 -1 0 1
  [2,24,1,0,1,-1,0,1],
// 2 24 -1 0 1 -1 0 -1
  [2,24,-1,0,1,-1,0,-1],
// 2 24 -1 0 -1 1 0 -1
  [2,24,-1,0,-1,1,0,-1],
// 2 24 1 0 -1 1 0 1
  [2,24,1,0,-1,1,0,1],
// 2 24 1 0 1 1 1 1
  [2,24,1,0,1,1,1,1],
// 2 24 -1 0 1 -1 1 1
  [2,24,-1,0,1,-1,1,1],
// 2 24 1 0 -1 1 1 -1
  [2,24,1,0,-1,1,1,-1],
// 2 24 -1 0 -1 -1 1 -1
  [2,24,-1,0,-1,-1,1,-1],
// 4 16 1 1 1 1 1 -1 -1 1 -1 -1 1 1
  [4,16,1,1,1,1,1,-1,-1,1,-1,-1,1,1],
// 4 16 1 1 1 -1 1 1 -1 0 1 1 0 1
  [4,16,1,1,1,-1,1,1,-1,0,1,1,0,1],
// 4 16 -1 1 1 -1 1 -1 -1 0 -1 -1 0 1
  [4,16,-1,1,1,-1,1,-1,-1,0,-1,-1,0,1],
// 0 4 16 -1 1 -1 -1 0 -1 1 0 -1 1 1 -1
// 4 16 1 1 -1 1 1 1 1 0 1 1 0 -1
  [4,16,1,1,-1,1,1,1,1,0,1,1,0,-1],
// 0
];
module ldraw_lib__box4t(step=0, col=false, unit=2/5, alt=false, line=0.2, solid=!$preview)
    makepoly(ldraw_lib__box4t(solid), step=step, col=col, unit=unit, alt=alt, line=line, solid=solid);
ldraw_lib__box4t(line=0.2);
// file: s/3004s01.scad
use <../../lib.scad>
use <../../p/box4t.scad>
use <../../p/box5.scad>
use <../../p/stud.scad>
use <../../p/stud3.scad>
$fa=1; $fs=0.2;
function ldraw_lib__s__3004s01(realsolid=false) = [
// 0 ~Brick  1 x  2 without Front Face
// 0 Name: s\3004s01.dat
// 0 Author: James Jessiman
// 0 !LDRAW_ORG Subpart UPDATE 2003-03
// 0 !LICENSE Licensed under CC BY 2.0 and CC BY 4.0 : see CAreadme.txt
// 
// 0 BFC CERTIFY CCW
  [0,"BFC","CERTIFY"],
  [0,"BFC","CCW"],
// 
// 0 !HISTORY 2003-09-07 [jriley] Subfiling, BFC
// 0 !HISTORY 2003-12-19 [PTadmin] Official Update 2003-03
// 0 !HISTORY 2007-08-29 [PTadmin] Header formatted for Contributor Agreement
// 0 !HISTORY 2008-07-01 [PTadmin] Official Update 2008-01
// 
// 
// 1 16 0 4 0 1 0 0 0 -5 0 0 0 1 stud3.dat
  [1,16,0,4,0,1,0,0,0,-5,0,0,0,1, ldraw_lib__stud3(realsolid)],
// 0 BFC INVERTNEXT
  [0,"BFC","INVERTNEXT"],
// 1 16 0 24 0 16 0 0 0 -20 0 0 0 6 box5.dat
  [1,16,0,24,0,16,0,0,0,-20,0,0,0,6, ldraw_lib__box5(realsolid)],
// 4 16 20 24 10 16 24 6 -16 24 6 -20 24 10
  [4,16,20,24,10,16,24,6,-16,24,6,-20,24,10],
// 4 16 -20 24 10 -16 24 6 -16 24 -6 -20 24 -10
  [4,16,-20,24,10,-16,24,6,-16,24,-6,-20,24,-10],
// 4 16 -20 24 -10 -16 24 -6 16 24 -6 20 24 -10
  [4,16,-20,24,-10,-16,24,-6,16,24,-6,20,24,-10],
// 4 16 20 24 -10 16 24 -6 16 24 6 20 24 10
  [4,16,20,24,-10,16,24,-6,16,24,6,20,24,10],
// 1 16 0 24 0 20 0 0 0 -24 0 0 0 10 box4t.dat
  [1,16,0,24,0,20,0,0,0,-24,0,0,0,10, ldraw_lib__box4t(realsolid)],
// 1 16 10 0 0 1 0 0 0 1 0 0 0 1 stud.dat
  [1,16,10,0,0,1,0,0,0,1,0,0,0,1, ldraw_lib__stud(realsolid)],
// 1 16 -10 0 0 1 0 0 0 1 0 0 0 1 stud.dat
  [1,16,-10,0,0,1,0,0,0,1,0,0,0,1, ldraw_lib__stud(realsolid)],
// 0
];
module ldraw_lib__s__3004s01(step=0, col=false, unit=2/5, alt=false, line=0.2, solid=!$preview)
    makepoly(ldraw_lib__s__3004s01(solid), step=step, col=col, unit=unit, alt=alt, line=line, solid=solid);
ldraw_lib__s__3004s01(line=0.2);
// file: s/3005s01.scad
use <../../lib.scad>
use <../../p/box4t.scad>
use <../../p/box5.scad>
use <../../p/stud.scad>
$fa=1; $fs=0.2;
function ldraw_lib__s__3005s01(realsolid=false) = [
// 0 ~Brick  1 x  1 without Front Face
// 0 Name: s\3005s01.dat
// 0 Author: John Riley [jriley]
// 0 !LDRAW_ORG Subpart UPDATE 2004-01
// 0 !LICENSE Licensed under CC BY 2.0 and CC BY 4.0 : see CAreadme.txt
// 
// 0 BFC CERTIFY CCW
  [0,"BFC","CERTIFY"],
  [0,"BFC","CCW"],
// 
// 0 !HISTORY 2003-09-07 [jriley] BFCed & Subfiled
// 0 !HISTORY 2004-03-02 [PTadmin] Official Update 2004-01
// 0 !HISTORY 2007-08-29 [PTadmin] Header formatted for Contributor Agreement
// 0 !HISTORY 2008-07-01 [PTadmin] Official Update 2008-01
// 
// 
// 0 BFC INVERTNEXT
  [0,"BFC","INVERTNEXT"],
// 1 16 0 24 0 0 0 6 0 -20 0 -6 0 0 box5.dat
  [1,16,0,24,0,0,0,6,0,-20,0,-6,0,0, ldraw_lib__box5(realsolid)],
// 4 16 10 24 -10 6 24 -6 6 24 6 10 24 10
  [4,16,10,24,-10,6,24,-6,6,24,6,10,24,10],
// 4 16 10 24 10 6 24 6 -6 24 6 -10 24 10
  [4,16,10,24,10,6,24,6,-6,24,6,-10,24,10],
// 4 16 -10 24 10 -6 24 6 -6 24 -6 -10 24 -10
  [4,16,-10,24,10,-6,24,6,-6,24,-6,-10,24,-10],
// 4 16 -10 24 -10 -6 24 -6 6 24 -6 10 24 -10
  [4,16,-10,24,-10,-6,24,-6,6,24,-6,10,24,-10],
// 1 16 0 24 0 10 0 0 0 -24 0 0 0 10 box4t.dat
  [1,16,0,24,0,10,0,0,0,-24,0,0,0,10, ldraw_lib__box4t(realsolid)],
// 1 16 0 0 0 0 0 1 0 1 0 -1 0 0 stud.dat
  [1,16,0,0,0,0,0,1,0,1,0,-1,0,0, ldraw_lib__stud(realsolid)],
// 0
];
module ldraw_lib__s__3005s01(step=0, col=false, unit=2/5, alt=false, line=0.2, solid=!$preview)
    makepoly(ldraw_lib__s__3005s01(solid), step=step, col=col, unit=unit, alt=alt, line=line, solid=solid);
ldraw_lib__s__3005s01(line=0.2);
// file: 3004.scad
use <../lib.scad>
use <s/3004s01.scad>
$fa=1; $fs=0.2;
function ldraw_lib__3004(realsolid=false) = [
// 0 Brick  1 x  2
// 0 Name: 3004.dat
// 0 Author: James Jessiman
// 0 !LDRAW_ORG Part UPDATE 2022-05
// 0 !LICENSE Licensed under CC BY 2.0 and CC BY 4.0 : see CAreadme.txt
// 
// 0 BFC CERTIFY CCW
  [0,"BFC","CERTIFY"],
  [0,"BFC","CCW"],
// 
// 0 !HISTORY 2001-10-26 [PTadmin] Official Update 2001-01
// 0 !HISTORY 2002-05-07 {unknown} BFC Certification
// 0 !HISTORY 2002-06-11 [PTadmin] Official Update 2002-03
// 0 !HISTORY 2007-05-07 [PTadmin] Header formatted for Contributor Agreement
// 0 !HISTORY 2008-07-01 [PTadmin] Official Update 2008-01
// 0 !HISTORY 2022-08-04 [MagFors] Using subfile
// 0 !HISTORY 2022-09-15 [PTadmin] Official Update 2022-05
// 
// 
// 1 16 0 0 0 1 0 0 0 1 0 0 0 1 s\3004s01.dat
  [1,16,0,0,0,1,0,0,0,1,0,0,0,1, ldraw_lib__s__3004s01(realsolid)],
// 4 16 -20 24 -10 20 24 -10 20 0 -10 -20 0 -10
  [4,16,-20,24,-10,20,24,-10,20,0,-10,-20,0,-10],
];
module ldraw_lib__3004(step=0, col=false, unit=2/5, alt=false, line=0.2, solid=!$preview)
    makepoly(ldraw_lib__3004(solid), step=step, col=col, unit=unit, alt=alt, line=line, solid=solid);
ldraw_lib__3004(line=0.2);
// file: 3005ptn.scad
use <../lib.scad>
use <s/3005s01.scad>
$fa=1; $fs=0.2;
function ldraw_lib__3005ptn(realsolid=false) = [
// 0 Brick  1 x  1 with Blue "N" Pattern
// 0 Name: 3005ptn.dat
// 0 Author: Tore Eriksson [Tore_Eriksson]
// 0 !LDRAW_ORG Part UPDATE 2015-01
// 0 !LICENSE Licensed under CC BY 2.0 and CC BY 4.0 : see CAreadme.txt
// 
// 0 BFC CERTIFY CCW
  [0,"BFC","CERTIFY"],
  [0,"BFC","CCW"],
// 
// 0 !HISTORY 2003-12-09 [Steffen] made use of existing subfile
// 0 !HISTORY 2004-04-22 [PTadmin] Official Update 2004-02
// 0 !HISTORY 2007-05-11 [PTadmin] Header formatted for Contributor Agreement
// 0 !HISTORY 2008-07-01 [PTadmin] Official Update 2008-01
// 0 !HISTORY 2014-12-22 [Holly-Wood] Fixed T-Junction, BFCed
// 0 !HISTORY 2015-10-11 [PTadmin] Official Update 2015-01
// 
// 
// 0 // Pattern
// 
// 4 1 -6 19 -10 -4 19 -10 -4 9 -10 -6 5 -10
  [4,1,-6,19,-10,-4,19,-10,-4,9,-10,-6,5,-10],
// 3 1 -4 5 -10 -6 5 -10 -4 9 -10
  [3,1,-4,5,-10,-6,5,-10,-4,9,-10],
// 4 1 4 19 -10 4 15 -10 -4 5 -10 -4 9 -10
  [4,1,4,19,-10,4,15,-10,-4,5,-10,-4,9,-10],
// 4 1 4 15 -10 4 19 -10 6 19 -10 6 5 -10
  [4,1,4,15,-10,4,19,-10,6,19,-10,6,5,-10],
// 3 1 6 5 -10 4 5 -10 4 15 -10
  [3,1,6,5,-10,4,5,-10,4,15,-10],
// 3 16 4 5 -10 -4 5 -10 4 15 -10
  [3,16,4,5,-10,-4,5,-10,4,15,-10],
// 3 16 -4 9 -10 -4 19 -10 4 19 -10
  [3,16,-4,9,-10,-4,19,-10,4,19,-10],
// 4 16 -10 24 -10 -6 19 -10 -6 5 -10 -10 0 -10
  [4,16,-10,24,-10,-6,19,-10,-6,5,-10,-10,0,-10],
// 3 16 -10 0 -10 -6 5 -10 -4 5 -10
  [3,16,-10,0,-10,-6,5,-10,-4,5,-10],
// 4 16 -10 0 -10 -4 5 -10 4 5 -10 10 0 -10
  [4,16,-10,0,-10,-4,5,-10,4,5,-10,10,0,-10],
// 3 16 10 0 -10 4 5 -10 6 5 -10
  [3,16,10,0,-10,4,5,-10,6,5,-10],
// 4 16 10 24 -10 10 0 -10 6 5 -10 6 19 -10
  [4,16,10,24,-10,10,0,-10,6,5,-10,6,19,-10],
// 3 16 6 19 -10 4 19 -10 10 24 -10
  [3,16,6,19,-10,4,19,-10,10,24,-10],
// 4 16 10 24 -10 4 19 -10 -4 19 -10 -10 24 -10
  [4,16,10,24,-10,4,19,-10,-4,19,-10,-10,24,-10],
// 3 16 -4 19 -10 -6 19 -10 -10 24 -10
  [3,16,-4,19,-10,-6,19,-10,-10,24,-10],
// 
// 0 // Subfile
// 1 16 0 0 0 1 0 0 0 1 0 0 0 1 s\3005s01.dat
  [1,16,0,0,0,1,0,0,0,1,0,0,0,1, ldraw_lib__s__3005s01(realsolid)],
];
module ldraw_lib__3005ptn(step=0, col=false, unit=2/5, alt=false, line=0.2, solid=!$preview)
    makepoly(ldraw_lib__3005ptn(solid), step=step, col=col, unit=unit, alt=alt, line=line, solid=solid);
ldraw_lib__3005ptn(line=0.2);
// main file
use <../lib.scad>
use <3005ptn.scad>
$fa=1; $fs=0.2;
function ldraw_lib__3005_n(realsolid=false) = [
// 0 ~Moved to 3005ptn
// 0 Name: 3005-n.dat
// 0 Author: [PTadmin]
// 0 !LDRAW_ORG Part UPDATE 2004-02
// 0 !LICENSE Licensed under CC BY 4.0 : see CAreadme.txt
// 
// 0 BFC CERTIFY CCW
  [0,"BFC","CERTIFY"],
  [0,"BFC","CCW"],
// 
// 0 !HISTORY 1998-12-15 [PTadmin] Official Update 1998-10
// 0 !HISTORY 2004-04-22 [PTadmin] Official Update 2004-02
// 0 !HISTORY 2007-05-11 [PTadmin] Header formatted for Contributor Agreement
// 0 !HISTORY 2008-07-01 [PTadmin] Official Update 2008-01
// 
// 
// 1 16 0 0 0 1 0 0 0 1 0 0 0 1 3005ptn.dat
  [1,16,0,0,0,1,0,0,0,1,0,0,0,1, ldraw_lib__3005ptn(realsolid)],
];
module ldraw_lib__3005_n(step=0, col=false, unit=2/5, alt=false, line=0.2, solid=!$preview)
    makepoly(ldraw_lib__3005_n(solid), step=step, col=col, unit=unit, alt=alt, line=line, solid=solid);
ldraw_lib__3005_n(line=0.2);
